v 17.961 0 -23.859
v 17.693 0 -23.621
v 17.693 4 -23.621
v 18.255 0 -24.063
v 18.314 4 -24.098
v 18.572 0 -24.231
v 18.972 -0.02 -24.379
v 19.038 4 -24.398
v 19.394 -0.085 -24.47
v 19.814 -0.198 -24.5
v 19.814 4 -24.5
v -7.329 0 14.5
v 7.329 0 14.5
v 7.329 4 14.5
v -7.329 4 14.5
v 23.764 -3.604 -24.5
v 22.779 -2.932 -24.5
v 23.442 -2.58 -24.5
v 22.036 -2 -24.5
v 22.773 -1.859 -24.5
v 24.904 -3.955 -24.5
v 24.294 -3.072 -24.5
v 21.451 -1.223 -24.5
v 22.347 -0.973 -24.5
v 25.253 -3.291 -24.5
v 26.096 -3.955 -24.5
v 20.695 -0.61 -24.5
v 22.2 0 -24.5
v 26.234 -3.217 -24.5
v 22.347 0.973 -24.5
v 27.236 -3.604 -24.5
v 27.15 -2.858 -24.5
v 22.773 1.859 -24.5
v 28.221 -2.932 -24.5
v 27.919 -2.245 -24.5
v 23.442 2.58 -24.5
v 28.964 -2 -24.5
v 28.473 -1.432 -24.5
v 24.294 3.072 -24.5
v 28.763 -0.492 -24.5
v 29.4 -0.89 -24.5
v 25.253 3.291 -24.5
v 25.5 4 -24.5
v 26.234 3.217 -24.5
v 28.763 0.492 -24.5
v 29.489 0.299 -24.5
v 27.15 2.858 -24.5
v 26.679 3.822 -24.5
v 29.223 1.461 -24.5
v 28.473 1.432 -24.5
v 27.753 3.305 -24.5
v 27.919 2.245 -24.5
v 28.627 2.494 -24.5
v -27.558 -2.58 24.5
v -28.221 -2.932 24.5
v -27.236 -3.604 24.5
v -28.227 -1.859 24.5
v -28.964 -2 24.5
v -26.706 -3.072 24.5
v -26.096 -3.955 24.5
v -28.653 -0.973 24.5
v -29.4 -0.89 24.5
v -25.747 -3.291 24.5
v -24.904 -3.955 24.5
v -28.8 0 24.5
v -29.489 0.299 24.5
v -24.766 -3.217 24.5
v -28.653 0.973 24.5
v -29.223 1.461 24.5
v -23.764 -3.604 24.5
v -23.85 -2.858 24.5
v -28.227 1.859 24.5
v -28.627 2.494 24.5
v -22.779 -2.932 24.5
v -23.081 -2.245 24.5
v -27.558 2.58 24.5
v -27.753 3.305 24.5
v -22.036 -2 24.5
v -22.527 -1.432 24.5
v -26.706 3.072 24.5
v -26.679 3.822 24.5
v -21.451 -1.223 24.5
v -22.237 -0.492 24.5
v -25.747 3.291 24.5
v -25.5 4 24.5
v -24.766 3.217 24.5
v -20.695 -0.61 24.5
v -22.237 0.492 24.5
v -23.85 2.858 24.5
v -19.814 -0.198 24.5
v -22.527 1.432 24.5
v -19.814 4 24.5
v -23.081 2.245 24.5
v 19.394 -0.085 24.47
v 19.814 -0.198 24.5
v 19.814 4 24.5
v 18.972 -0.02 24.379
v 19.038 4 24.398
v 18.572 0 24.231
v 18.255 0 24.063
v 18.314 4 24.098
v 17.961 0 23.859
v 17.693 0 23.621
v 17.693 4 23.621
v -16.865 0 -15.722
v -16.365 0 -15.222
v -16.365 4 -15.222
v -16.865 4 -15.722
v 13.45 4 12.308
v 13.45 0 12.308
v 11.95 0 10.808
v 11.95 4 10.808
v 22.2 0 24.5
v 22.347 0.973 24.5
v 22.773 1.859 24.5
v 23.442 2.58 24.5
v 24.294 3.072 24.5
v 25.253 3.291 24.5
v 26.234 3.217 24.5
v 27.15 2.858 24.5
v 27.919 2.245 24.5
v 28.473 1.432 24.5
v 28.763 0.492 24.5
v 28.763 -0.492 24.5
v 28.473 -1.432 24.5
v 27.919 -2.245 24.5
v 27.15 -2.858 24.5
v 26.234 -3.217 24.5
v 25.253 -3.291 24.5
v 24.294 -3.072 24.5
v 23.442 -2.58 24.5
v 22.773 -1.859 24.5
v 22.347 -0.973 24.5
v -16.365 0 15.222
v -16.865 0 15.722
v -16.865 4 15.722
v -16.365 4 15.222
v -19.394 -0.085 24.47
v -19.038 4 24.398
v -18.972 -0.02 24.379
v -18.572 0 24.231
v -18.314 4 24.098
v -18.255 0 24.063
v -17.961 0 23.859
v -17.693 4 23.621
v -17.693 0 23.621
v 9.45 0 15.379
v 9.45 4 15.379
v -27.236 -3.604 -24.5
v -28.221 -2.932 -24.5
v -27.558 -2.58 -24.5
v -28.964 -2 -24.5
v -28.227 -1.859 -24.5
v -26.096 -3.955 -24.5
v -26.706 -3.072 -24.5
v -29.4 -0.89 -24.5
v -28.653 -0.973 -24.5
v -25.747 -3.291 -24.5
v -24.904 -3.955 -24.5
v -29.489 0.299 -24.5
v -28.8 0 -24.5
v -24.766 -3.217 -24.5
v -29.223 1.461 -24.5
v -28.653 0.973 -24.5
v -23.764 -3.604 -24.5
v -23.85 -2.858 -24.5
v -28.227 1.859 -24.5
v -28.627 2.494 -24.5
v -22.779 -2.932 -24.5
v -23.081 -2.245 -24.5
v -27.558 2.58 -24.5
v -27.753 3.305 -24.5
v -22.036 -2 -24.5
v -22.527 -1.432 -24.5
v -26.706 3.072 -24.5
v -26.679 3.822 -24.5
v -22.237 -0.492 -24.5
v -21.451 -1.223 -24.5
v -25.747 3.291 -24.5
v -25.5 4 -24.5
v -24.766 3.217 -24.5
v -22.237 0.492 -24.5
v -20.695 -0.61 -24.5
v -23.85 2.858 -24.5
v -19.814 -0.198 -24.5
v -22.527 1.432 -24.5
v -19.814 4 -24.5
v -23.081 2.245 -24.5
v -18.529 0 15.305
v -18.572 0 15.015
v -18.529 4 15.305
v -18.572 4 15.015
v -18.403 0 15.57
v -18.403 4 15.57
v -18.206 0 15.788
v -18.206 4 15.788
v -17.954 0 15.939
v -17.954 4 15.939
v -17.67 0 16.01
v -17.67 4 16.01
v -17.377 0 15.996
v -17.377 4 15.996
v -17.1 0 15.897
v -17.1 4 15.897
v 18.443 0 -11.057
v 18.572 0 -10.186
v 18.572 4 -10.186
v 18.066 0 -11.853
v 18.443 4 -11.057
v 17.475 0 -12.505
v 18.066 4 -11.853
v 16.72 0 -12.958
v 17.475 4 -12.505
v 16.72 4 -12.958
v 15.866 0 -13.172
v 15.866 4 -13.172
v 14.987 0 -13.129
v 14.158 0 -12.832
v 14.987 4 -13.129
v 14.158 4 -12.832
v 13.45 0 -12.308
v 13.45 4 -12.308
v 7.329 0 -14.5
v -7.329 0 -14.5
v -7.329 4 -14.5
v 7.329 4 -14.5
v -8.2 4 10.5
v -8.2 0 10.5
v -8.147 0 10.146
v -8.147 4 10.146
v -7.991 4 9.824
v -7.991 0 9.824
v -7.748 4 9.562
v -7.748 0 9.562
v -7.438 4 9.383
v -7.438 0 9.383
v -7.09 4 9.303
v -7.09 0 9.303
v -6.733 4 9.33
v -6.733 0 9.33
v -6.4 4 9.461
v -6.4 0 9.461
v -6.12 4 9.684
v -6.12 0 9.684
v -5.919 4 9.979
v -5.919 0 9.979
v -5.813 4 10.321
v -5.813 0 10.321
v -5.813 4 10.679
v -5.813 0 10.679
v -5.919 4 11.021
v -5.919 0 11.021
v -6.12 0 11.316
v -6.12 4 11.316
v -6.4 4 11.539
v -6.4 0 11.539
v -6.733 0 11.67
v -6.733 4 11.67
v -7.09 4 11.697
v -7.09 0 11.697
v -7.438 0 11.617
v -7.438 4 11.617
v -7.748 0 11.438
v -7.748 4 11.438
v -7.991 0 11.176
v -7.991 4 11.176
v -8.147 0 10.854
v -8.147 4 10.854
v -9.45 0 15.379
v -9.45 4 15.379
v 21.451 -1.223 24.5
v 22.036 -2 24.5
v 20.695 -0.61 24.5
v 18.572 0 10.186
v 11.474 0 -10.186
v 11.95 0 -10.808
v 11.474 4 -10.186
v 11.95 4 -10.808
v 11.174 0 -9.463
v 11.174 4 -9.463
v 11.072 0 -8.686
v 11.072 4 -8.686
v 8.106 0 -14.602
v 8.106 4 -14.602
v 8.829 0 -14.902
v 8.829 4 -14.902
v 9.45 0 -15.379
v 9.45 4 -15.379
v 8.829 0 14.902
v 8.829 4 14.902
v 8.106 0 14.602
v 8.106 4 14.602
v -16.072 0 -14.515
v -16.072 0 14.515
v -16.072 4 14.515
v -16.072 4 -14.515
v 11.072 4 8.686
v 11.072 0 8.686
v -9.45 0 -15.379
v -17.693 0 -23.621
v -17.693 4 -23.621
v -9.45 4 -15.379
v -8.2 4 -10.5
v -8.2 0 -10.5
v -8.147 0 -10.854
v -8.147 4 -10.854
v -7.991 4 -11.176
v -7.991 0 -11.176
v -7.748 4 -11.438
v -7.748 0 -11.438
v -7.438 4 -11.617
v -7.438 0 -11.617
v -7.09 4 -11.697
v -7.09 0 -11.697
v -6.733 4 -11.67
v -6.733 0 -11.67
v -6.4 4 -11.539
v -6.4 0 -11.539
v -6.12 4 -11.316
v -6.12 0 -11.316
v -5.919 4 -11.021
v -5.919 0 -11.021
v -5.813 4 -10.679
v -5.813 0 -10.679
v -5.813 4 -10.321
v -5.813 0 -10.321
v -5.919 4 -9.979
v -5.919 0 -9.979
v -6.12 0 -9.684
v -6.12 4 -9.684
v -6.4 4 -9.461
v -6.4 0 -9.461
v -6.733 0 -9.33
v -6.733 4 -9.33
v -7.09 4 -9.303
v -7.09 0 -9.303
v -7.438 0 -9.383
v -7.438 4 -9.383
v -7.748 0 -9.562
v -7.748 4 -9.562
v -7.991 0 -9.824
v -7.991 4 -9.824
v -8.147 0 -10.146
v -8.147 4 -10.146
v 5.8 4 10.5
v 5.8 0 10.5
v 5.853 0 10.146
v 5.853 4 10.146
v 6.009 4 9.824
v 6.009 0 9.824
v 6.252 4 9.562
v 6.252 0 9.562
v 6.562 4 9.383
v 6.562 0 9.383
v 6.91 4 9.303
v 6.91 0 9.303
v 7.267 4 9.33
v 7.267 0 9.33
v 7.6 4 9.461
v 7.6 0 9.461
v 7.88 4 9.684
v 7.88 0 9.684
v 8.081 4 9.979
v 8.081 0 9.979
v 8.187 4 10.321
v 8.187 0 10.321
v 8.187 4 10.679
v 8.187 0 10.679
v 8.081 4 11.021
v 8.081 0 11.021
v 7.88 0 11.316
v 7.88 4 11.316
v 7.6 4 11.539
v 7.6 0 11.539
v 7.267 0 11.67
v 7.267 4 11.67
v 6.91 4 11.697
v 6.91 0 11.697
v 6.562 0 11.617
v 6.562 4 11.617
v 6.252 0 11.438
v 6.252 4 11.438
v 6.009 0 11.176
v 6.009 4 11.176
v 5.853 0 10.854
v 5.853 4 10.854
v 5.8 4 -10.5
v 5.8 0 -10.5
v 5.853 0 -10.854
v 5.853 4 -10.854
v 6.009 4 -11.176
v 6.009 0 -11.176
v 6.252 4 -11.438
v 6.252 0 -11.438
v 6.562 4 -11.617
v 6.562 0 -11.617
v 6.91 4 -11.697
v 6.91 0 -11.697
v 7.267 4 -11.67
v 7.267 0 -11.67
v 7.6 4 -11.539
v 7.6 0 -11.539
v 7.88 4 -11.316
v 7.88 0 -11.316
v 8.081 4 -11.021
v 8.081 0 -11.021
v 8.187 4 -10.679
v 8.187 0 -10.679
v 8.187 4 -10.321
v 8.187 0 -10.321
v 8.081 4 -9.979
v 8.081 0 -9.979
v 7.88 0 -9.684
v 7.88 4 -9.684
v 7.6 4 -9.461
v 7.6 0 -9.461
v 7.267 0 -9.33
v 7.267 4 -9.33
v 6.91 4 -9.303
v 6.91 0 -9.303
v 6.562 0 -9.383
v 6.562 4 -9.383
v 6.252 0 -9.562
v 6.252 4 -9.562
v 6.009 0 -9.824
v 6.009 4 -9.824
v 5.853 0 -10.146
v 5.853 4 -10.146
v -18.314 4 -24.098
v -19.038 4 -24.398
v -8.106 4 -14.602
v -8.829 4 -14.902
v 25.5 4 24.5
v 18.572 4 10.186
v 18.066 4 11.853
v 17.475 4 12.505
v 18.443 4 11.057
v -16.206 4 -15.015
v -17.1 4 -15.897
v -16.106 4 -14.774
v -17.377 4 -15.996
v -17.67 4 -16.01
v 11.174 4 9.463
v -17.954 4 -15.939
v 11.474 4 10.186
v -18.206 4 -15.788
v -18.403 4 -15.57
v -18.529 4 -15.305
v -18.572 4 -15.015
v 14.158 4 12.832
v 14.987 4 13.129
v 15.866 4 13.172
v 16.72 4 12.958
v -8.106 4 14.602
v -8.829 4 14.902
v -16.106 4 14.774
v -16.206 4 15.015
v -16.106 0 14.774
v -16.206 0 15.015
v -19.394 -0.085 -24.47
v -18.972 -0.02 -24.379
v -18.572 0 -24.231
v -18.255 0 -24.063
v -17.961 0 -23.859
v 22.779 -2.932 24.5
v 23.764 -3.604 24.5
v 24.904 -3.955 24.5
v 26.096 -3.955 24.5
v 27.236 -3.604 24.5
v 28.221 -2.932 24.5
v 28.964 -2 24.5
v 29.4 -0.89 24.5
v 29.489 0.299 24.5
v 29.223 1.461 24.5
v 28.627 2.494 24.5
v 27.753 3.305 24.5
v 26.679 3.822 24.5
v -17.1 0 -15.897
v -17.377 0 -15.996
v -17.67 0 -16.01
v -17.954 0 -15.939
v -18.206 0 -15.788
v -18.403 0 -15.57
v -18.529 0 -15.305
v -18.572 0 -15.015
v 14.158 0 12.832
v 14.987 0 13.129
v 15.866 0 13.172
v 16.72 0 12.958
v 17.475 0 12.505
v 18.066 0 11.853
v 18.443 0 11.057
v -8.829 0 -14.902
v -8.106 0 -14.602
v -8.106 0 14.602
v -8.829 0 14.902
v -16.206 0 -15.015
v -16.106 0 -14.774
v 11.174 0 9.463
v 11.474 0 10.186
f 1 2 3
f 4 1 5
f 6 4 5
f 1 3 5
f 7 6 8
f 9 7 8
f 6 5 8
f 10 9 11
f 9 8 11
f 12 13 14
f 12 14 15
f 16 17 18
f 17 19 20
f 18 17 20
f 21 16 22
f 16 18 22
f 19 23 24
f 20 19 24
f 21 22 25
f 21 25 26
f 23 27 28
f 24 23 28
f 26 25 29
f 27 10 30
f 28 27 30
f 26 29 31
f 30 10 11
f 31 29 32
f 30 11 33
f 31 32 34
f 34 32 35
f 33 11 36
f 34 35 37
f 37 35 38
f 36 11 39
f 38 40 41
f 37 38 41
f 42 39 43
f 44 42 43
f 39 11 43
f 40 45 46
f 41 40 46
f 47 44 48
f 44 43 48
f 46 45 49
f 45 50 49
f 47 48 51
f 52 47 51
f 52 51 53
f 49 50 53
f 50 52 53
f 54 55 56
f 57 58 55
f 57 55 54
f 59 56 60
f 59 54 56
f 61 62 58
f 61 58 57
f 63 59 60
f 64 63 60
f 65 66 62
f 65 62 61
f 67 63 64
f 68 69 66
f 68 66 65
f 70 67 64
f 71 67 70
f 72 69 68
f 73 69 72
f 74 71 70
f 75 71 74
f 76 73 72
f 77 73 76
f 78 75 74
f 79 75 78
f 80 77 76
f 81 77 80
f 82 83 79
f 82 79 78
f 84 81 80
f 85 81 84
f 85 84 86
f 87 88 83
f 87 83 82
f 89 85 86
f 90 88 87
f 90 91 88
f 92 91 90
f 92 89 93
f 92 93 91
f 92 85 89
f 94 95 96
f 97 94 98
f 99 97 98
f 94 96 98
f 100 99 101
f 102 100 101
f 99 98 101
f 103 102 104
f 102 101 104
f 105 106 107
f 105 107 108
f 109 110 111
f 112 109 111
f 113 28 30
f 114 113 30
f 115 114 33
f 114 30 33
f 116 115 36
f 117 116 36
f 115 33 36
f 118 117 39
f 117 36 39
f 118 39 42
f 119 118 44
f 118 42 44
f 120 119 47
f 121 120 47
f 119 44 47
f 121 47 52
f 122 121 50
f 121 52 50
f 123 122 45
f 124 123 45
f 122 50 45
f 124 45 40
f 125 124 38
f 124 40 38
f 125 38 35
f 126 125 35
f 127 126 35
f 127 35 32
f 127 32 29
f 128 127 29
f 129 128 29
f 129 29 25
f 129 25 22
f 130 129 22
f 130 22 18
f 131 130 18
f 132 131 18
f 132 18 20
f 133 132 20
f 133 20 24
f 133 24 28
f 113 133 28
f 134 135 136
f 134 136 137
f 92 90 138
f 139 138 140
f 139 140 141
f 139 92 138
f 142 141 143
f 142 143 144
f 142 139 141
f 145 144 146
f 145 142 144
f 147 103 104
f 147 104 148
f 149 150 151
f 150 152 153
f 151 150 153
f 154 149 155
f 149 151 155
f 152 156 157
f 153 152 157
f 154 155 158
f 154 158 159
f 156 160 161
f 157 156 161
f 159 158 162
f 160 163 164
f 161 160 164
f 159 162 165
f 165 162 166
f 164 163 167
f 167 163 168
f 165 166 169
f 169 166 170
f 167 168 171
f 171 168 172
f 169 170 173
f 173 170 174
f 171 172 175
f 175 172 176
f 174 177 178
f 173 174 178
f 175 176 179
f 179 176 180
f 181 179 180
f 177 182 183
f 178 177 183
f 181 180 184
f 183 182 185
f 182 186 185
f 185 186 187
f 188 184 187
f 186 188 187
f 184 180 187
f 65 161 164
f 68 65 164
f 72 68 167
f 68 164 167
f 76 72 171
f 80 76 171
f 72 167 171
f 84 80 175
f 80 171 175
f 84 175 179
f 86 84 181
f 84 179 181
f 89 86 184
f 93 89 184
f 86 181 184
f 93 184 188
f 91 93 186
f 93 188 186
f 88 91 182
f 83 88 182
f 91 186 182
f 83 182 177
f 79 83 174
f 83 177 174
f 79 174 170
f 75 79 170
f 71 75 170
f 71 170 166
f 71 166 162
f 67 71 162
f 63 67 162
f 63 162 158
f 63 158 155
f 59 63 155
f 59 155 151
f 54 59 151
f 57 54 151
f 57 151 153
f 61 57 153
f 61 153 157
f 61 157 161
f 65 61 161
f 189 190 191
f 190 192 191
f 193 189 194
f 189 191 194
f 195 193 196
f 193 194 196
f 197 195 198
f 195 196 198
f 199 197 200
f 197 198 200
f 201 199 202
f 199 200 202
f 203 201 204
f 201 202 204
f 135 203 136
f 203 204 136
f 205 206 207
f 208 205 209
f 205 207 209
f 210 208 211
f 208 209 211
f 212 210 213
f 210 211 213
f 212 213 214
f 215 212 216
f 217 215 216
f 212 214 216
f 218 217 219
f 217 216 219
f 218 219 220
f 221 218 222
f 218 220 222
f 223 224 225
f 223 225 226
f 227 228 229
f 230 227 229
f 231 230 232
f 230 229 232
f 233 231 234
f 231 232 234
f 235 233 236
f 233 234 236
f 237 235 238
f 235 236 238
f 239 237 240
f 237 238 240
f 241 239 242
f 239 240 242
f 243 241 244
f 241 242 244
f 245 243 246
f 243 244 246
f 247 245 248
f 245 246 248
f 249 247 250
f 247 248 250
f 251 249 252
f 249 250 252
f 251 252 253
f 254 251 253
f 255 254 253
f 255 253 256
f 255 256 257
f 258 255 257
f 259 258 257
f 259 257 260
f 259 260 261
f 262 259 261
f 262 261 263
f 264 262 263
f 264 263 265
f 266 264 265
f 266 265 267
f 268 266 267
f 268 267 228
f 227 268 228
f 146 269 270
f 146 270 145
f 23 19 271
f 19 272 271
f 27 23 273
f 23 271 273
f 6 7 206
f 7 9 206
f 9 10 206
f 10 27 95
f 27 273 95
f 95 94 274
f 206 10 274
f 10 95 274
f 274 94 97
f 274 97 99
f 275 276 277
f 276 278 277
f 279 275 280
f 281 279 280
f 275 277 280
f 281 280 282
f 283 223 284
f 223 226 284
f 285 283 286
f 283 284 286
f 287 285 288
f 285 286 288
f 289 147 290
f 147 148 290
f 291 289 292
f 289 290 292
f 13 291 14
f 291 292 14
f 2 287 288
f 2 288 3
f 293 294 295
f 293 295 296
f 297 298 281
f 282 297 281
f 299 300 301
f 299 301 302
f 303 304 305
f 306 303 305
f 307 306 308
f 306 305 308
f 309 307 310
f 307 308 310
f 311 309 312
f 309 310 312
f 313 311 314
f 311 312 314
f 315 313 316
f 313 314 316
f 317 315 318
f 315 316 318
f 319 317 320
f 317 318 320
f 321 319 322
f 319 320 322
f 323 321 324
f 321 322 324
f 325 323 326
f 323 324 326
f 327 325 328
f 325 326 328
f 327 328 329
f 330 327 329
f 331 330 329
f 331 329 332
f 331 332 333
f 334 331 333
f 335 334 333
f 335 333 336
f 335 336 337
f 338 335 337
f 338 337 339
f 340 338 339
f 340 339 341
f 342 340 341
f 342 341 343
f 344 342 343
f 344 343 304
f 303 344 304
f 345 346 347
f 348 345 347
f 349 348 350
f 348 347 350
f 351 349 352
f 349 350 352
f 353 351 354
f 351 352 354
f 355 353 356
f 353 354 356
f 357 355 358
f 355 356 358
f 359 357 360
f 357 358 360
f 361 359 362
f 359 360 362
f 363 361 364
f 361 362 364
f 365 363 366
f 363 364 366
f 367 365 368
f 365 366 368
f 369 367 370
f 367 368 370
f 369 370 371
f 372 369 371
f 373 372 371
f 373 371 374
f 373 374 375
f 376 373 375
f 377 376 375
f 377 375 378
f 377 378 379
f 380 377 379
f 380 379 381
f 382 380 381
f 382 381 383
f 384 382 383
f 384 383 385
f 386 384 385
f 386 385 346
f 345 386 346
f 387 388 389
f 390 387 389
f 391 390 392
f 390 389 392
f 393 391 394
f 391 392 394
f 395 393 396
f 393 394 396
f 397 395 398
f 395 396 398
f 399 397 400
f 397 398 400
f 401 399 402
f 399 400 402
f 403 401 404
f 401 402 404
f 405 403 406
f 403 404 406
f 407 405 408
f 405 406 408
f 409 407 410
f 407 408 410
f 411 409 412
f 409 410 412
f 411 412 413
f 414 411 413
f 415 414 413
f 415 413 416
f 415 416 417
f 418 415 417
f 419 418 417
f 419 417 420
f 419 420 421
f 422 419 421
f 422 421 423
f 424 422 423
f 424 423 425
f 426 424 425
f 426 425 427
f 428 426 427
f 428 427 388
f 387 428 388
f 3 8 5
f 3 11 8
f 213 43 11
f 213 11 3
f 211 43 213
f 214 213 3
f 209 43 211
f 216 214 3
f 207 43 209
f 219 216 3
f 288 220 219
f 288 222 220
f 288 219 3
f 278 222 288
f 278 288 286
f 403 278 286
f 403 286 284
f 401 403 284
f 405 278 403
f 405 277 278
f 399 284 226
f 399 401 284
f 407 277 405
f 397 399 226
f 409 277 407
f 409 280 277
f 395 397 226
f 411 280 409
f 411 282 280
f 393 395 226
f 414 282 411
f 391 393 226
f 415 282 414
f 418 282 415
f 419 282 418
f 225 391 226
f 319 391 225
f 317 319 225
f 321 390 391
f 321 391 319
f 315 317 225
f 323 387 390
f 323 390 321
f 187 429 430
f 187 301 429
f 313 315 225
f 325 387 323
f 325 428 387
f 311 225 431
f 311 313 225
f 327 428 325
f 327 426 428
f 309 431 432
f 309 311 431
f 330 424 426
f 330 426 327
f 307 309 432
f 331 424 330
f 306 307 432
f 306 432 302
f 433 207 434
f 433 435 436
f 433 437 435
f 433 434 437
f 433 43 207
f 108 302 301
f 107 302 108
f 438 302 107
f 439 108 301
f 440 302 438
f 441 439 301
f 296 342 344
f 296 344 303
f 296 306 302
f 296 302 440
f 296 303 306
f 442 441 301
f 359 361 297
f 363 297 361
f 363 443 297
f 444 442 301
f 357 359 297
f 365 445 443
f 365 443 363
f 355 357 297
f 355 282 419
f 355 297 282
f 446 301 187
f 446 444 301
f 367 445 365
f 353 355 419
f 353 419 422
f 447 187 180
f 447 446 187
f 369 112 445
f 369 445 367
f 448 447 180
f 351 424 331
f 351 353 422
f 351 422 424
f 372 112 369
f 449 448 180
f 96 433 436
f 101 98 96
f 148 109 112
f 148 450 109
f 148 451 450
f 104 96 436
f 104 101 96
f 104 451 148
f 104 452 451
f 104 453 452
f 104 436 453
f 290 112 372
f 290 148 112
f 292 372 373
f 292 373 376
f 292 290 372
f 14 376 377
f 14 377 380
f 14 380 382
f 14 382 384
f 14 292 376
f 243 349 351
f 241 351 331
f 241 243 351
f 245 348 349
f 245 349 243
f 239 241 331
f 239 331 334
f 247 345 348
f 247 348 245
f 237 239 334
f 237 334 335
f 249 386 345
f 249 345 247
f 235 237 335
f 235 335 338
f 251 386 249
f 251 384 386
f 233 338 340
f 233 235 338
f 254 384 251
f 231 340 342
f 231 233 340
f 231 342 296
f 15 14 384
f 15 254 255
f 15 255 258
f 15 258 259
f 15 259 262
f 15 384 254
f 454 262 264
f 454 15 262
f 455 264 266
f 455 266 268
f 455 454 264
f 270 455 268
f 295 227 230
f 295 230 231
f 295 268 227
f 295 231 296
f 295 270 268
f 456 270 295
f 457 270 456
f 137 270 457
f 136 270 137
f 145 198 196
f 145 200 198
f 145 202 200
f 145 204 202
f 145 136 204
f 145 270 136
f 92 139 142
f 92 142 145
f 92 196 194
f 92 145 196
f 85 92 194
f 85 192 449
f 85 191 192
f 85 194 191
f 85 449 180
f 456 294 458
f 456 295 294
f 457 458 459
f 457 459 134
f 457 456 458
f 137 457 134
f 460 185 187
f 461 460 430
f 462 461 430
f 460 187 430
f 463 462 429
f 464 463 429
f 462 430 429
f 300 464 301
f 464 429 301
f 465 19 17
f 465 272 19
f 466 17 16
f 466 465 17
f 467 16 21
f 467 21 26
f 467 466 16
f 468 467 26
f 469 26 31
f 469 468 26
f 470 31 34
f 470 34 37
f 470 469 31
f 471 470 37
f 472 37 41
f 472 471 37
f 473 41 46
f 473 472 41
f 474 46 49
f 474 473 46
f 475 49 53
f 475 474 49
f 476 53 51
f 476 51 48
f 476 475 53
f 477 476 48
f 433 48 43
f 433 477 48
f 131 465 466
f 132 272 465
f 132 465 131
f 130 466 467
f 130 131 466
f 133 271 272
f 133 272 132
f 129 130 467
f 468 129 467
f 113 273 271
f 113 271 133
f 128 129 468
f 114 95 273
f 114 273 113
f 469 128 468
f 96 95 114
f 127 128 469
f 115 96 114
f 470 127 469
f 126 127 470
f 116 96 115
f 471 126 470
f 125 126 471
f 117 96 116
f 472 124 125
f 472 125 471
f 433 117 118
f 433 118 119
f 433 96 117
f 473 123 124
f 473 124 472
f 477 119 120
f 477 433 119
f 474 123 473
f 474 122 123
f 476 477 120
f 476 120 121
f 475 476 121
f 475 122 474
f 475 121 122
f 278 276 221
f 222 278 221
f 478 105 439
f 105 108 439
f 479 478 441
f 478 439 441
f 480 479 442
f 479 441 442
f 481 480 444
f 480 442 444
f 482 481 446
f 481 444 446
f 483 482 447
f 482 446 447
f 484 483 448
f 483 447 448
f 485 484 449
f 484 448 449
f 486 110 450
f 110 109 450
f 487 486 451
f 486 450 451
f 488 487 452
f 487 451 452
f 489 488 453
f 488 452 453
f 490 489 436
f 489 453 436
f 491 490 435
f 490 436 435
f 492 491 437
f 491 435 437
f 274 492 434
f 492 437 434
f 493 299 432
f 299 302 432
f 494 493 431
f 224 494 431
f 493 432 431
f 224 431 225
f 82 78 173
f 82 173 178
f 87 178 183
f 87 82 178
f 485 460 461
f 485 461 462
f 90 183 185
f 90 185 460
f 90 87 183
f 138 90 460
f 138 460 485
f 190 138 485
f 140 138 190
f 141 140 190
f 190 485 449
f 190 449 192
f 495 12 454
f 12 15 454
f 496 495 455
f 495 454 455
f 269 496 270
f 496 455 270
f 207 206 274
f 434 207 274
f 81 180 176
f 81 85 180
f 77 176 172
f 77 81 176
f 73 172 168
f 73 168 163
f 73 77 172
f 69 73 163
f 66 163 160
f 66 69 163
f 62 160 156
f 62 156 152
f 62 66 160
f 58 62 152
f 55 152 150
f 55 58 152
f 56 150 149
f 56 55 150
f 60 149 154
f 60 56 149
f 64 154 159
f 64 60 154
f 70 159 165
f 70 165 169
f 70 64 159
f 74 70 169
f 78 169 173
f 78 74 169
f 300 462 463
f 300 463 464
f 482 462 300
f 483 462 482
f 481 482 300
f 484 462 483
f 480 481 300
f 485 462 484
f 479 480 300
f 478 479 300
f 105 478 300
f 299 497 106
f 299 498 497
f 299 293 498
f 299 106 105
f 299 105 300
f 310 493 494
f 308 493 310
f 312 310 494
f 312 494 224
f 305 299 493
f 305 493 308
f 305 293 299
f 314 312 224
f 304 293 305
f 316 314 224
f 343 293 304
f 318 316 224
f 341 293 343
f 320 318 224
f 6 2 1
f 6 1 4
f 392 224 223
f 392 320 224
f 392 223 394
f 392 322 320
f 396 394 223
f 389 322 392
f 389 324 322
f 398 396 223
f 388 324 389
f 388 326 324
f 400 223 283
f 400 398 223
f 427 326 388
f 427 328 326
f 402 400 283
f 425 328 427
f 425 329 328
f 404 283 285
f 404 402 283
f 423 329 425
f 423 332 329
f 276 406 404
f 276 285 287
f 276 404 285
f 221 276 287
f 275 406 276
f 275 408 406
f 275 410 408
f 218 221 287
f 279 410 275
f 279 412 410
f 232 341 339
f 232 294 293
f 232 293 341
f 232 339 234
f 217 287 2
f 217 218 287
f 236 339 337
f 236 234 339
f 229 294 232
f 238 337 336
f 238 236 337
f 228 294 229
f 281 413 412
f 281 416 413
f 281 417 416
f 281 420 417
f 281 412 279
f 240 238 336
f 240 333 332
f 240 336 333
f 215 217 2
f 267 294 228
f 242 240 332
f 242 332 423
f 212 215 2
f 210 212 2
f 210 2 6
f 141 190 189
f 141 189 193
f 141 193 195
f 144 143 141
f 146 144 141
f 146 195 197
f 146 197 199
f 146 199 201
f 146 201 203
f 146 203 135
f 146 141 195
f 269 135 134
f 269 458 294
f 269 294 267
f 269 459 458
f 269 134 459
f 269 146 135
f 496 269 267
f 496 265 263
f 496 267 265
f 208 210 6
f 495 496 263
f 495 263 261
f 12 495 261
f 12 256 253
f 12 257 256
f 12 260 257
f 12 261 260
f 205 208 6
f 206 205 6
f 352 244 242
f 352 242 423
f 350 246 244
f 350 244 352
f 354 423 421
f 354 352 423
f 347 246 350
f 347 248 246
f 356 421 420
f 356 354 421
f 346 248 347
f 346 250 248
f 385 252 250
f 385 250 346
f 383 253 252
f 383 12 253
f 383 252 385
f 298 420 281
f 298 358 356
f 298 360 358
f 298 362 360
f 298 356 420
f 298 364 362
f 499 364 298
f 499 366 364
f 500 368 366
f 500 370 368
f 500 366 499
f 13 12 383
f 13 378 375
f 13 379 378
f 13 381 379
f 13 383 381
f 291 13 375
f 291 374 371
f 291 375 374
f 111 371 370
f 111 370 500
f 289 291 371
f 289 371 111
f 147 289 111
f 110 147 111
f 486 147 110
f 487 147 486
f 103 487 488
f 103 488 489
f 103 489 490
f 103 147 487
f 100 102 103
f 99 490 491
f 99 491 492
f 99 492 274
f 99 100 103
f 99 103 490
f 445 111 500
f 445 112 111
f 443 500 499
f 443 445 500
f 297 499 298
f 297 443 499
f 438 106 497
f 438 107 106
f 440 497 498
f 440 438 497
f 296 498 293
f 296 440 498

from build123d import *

# Parameters (mm, degrees)
SKETCH1_R               = 4
BOSS_EXTRUDE1_DEPTH     = 24.5
FILLET1_R               = 4
M6_CLEARANCE_HOLE1_D    = 6.6
M2_CLEARANCE_HOLE1_D    = 2.4
CUT_EXTRUDE1_DEPTH      = 40.172694572
CUT_EXTRUDE1_DEPTH_BACK = 40.172694572
FILLET3_R               = 3
FILLET4_R               = 1


with BuildPart() as part:
    # Sketch1 → Boss-Extrude1 (new, symmetric)
    with BuildSketch(Plane.XY):
        with Locations((-25.5, 0)):
            Circle(SKETCH1_R)
        with BuildLine():
            Line((0, 4), (-25.5, 4))
            ThreePointArc((-25.5, 4), (-22.671572875, 2.828427125), (-21.5, 0))
            Line((-21.5, 0), (0, 0))
            Line((0, 0), (0, 4))
        make_face()
        with BuildLine():
            Line((25.5, 4), (0, 4))
            Line((0, 4), (0, 0))
            Line((0, 0), (21.5, 0))
            ThreePointArc((21.5, 0), (22.671572875, 2.828427125), (25.5, 4))
        make_face()
        with Locations((25.5, 0)):
            Circle(SKETCH1_R)
    extrude(amount=BOSS_EXTRUDE1_DEPTH, both=True)

    # Fillet1
    fillet1_edges = [part.edges().sort_by_distance(p)[0] for p in [
        (21.5, 0, 0),
        (-21.5, 0, 0),
    ]]
    fillet(fillet1_edges, radius=FILLET1_R)

    # M6 Clearance Hole1 (through all)
    with Locations(Plane.XY.offset(24.5)):
        with Locations((-25.5, 0), (25.5, 0)):
            Hole(M6_CLEARANCE_HOLE1_D / 2)

    # M2 Clearance Hole1 (through all)
    with Locations(Plane(origin=(0, 4, 0), x_dir=(1, 0, 0), z_dir=(0, 1, 0))):
        with Locations((-7, 10.5), (7, 10.5), (7, -10.5), (-7, -10.5)):
            Hole(M2_CLEARANCE_HOLE1_D / 2)

    # Sketch6 → Cut-Extrude1 (cut, two sides: drawn at the far end of the back side and taken through both)
    with BuildSketch(Plane(origin=(0, 4, 0), x_dir=(1, 0, 0), z_dir=(0, 1, 0)).offset(-CUT_EXTRUDE1_DEPTH_BACK)):
        Polygon((18.57179677, 24.5), (0, 24.5), (0, 14.5), (8.57179677, 14.5), align=None)
        Polygon((0, 24.5), (-18.57179677, 24.5), (-8.57179677, 14.5), (0, 14.5), align=None)
        Polygon((18.57179677, -17.428932188), (11.07179677, -9.928932188), (11.07179677, 9.928932188), (18.57179677, 17.428932188), align=None)
        Polygon((-8.57179677, -14.5), (-18.57179677, -24.5), (18.57179677, -24.5), (8.57179677, -14.5), align=None)
        Polygon((-16.07179677, 14.928932188), (-18.57179677, 17.428932188), (-18.57179677, 0.003413414), (-18.57179677, -0.003413414), (-18.57179677, -17.428932188), (-16.07179677, -14.928932188), align=None)
    extrude(amount=CUT_EXTRUDE1_DEPTH + CUT_EXTRUDE1_DEPTH_BACK, mode=Mode.SUBTRACT)

    # Fillet3
    fillet3_edges = [part.edges().sort_by_distance(p)[0] for p in [
        (18.57179677, 2, -17.428932188),
        (18.57179677, 2, 17.428932188),
        (11.07179677, 2, 9.928932188),
        (11.07179677, 2, -9.928932188),
        (18.57179677, 2, -24.5),
        (8.57179677, 2, -14.5),
        (-8.57179677, 2, -14.5),
        (-18.57179677, 2, -24.5),
        (-8.57179677, 2, 14.5),
        (8.57179677, 2, 14.5),
        (18.57179677, 2, 24.5),
        (-18.57179677, 2, 24.5),
    ]]
    fillet(fillet3_edges, radius=FILLET3_R)

    # Fillet4
    fillet4_edges = [part.edges().sort_by_distance(p)[0] for p in [
        (-18.57179677, 2, 17.428932188),
        (-18.57179677, 2, -17.428932188),
        (-16.07179677, 2, -14.928932188),
        (-16.07179677, 2, 14.928932188),
    ]]
    fillet(fillet4_edges, radius=FILLET4_R)


solid = part.part
